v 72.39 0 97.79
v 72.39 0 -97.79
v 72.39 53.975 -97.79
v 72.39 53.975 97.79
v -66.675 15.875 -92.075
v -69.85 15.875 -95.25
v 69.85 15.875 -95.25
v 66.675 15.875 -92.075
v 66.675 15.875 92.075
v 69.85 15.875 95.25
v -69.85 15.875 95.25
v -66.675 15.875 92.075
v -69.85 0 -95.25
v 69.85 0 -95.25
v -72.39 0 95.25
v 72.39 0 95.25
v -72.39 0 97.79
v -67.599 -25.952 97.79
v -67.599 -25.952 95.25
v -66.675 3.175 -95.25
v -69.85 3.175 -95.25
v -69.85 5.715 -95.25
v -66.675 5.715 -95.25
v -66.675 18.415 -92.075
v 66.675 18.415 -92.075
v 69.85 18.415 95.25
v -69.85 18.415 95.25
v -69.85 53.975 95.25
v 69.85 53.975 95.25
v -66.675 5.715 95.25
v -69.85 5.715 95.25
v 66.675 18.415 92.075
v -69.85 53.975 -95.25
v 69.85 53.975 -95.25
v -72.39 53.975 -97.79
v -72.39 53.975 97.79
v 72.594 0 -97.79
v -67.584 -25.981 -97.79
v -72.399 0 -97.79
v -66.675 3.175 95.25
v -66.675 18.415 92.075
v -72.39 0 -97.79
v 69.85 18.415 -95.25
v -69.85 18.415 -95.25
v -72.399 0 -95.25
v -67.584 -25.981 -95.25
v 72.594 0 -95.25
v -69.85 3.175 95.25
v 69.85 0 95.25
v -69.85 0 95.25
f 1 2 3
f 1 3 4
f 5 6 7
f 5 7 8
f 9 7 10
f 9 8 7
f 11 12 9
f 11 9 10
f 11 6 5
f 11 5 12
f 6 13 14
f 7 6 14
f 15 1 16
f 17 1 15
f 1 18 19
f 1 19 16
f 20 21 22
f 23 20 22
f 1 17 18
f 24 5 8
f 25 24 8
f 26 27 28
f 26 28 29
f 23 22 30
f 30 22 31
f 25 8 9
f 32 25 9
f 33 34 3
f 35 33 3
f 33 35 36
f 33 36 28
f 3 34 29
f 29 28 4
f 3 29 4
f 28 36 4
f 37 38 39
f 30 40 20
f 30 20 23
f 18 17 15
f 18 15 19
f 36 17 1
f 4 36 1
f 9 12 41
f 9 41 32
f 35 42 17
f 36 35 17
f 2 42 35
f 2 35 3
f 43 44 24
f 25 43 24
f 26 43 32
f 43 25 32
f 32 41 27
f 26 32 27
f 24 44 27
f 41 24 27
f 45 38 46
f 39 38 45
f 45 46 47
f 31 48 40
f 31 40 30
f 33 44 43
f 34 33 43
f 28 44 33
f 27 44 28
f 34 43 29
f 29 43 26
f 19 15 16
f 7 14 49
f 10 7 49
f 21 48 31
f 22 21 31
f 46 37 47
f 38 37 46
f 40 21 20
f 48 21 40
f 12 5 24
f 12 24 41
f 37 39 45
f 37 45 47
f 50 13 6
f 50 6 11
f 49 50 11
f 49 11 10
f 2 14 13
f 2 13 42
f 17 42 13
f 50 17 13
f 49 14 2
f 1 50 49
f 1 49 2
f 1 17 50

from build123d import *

# Parameters (mm, degrees)
F0_W      = 139.7
F0_H      = 190.5
F1_DEPTH  = 53.975
F2_T      = 2.54
F3_W      = 2.54
F3_H      = 190.5
F4_DEPTH  = 3.175
F5_W      = 2.54
F5_H      = 190.5
F6_DEPTH  = 139.7
F7_W      = 133.35
F7_H      = 184.15
F8_DEPTH  = 76.2
F11_DEPTH = 2.54
F13_DEPTH = 2.54


with BuildPart() as f1:
    # F0 (on Front) → F1 (new body)
    with BuildSketch(Plane.XZ):
        Rectangle(F0_W, F0_H)
    extrude(amount=-F1_DEPTH)

    # F2
    f2_openings = [f1.faces().sort_by_distance(p)[0] for p in [
        (0, 0, 0),
        (0, 53.975, 0),
    ]]
    offset(amount=F2_T, openings=f2_openings, kind=Kind.INTERSECTION)

    # F5 (on face) → F6 (join, through all)
    with BuildSketch(Plane.YZ.offset(-69.85)):
        with Locations((17.145, 0)):
            Rectangle(F5_W, F5_H)
    extrude(amount=F6_DEPTH)

    # F7 (on Front) → F8 (cut)
    with BuildSketch(Plane.XZ):
        Rectangle(F7_W, F7_H)
    extrude(amount=-F8_DEPTH, mode=Mode.SUBTRACT)


with BuildPart() as f4:
    # F3 (on face) → F4 (new body)
    with BuildSketch(Plane.YZ.offset(-69.85)):
        with Locations((4.445, 0)):
            Rectangle(F3_W, F3_H)
    extrude(amount=F4_DEPTH)


with BuildPart() as f11:
    # F10 (on face) → F11 (new body)
    with BuildSketch(Plane(origin=(0, 0, -97.79), x_dir=(1, 0, 0), z_dir=(0, 0, -1))):
        Polygon((-72.3992958665, 0), (72.5944414735, 0), (-67.5840847691, 25.9805541737), align=None)
    extrude(amount=-F11_DEPTH)


with BuildPart() as f13:
    # F12 (on face) → F13 (new body)
    with BuildSketch(Plane.XY.offset(97.79)):
        Polygon((-67.5991252065, -25.9523484856), (72.39, 0), (-72.39, 0), align=None)
    extrude(amount=-F13_DEPTH)


solid = Compound([f1.part, f4.part, f11.part, f13.part])
